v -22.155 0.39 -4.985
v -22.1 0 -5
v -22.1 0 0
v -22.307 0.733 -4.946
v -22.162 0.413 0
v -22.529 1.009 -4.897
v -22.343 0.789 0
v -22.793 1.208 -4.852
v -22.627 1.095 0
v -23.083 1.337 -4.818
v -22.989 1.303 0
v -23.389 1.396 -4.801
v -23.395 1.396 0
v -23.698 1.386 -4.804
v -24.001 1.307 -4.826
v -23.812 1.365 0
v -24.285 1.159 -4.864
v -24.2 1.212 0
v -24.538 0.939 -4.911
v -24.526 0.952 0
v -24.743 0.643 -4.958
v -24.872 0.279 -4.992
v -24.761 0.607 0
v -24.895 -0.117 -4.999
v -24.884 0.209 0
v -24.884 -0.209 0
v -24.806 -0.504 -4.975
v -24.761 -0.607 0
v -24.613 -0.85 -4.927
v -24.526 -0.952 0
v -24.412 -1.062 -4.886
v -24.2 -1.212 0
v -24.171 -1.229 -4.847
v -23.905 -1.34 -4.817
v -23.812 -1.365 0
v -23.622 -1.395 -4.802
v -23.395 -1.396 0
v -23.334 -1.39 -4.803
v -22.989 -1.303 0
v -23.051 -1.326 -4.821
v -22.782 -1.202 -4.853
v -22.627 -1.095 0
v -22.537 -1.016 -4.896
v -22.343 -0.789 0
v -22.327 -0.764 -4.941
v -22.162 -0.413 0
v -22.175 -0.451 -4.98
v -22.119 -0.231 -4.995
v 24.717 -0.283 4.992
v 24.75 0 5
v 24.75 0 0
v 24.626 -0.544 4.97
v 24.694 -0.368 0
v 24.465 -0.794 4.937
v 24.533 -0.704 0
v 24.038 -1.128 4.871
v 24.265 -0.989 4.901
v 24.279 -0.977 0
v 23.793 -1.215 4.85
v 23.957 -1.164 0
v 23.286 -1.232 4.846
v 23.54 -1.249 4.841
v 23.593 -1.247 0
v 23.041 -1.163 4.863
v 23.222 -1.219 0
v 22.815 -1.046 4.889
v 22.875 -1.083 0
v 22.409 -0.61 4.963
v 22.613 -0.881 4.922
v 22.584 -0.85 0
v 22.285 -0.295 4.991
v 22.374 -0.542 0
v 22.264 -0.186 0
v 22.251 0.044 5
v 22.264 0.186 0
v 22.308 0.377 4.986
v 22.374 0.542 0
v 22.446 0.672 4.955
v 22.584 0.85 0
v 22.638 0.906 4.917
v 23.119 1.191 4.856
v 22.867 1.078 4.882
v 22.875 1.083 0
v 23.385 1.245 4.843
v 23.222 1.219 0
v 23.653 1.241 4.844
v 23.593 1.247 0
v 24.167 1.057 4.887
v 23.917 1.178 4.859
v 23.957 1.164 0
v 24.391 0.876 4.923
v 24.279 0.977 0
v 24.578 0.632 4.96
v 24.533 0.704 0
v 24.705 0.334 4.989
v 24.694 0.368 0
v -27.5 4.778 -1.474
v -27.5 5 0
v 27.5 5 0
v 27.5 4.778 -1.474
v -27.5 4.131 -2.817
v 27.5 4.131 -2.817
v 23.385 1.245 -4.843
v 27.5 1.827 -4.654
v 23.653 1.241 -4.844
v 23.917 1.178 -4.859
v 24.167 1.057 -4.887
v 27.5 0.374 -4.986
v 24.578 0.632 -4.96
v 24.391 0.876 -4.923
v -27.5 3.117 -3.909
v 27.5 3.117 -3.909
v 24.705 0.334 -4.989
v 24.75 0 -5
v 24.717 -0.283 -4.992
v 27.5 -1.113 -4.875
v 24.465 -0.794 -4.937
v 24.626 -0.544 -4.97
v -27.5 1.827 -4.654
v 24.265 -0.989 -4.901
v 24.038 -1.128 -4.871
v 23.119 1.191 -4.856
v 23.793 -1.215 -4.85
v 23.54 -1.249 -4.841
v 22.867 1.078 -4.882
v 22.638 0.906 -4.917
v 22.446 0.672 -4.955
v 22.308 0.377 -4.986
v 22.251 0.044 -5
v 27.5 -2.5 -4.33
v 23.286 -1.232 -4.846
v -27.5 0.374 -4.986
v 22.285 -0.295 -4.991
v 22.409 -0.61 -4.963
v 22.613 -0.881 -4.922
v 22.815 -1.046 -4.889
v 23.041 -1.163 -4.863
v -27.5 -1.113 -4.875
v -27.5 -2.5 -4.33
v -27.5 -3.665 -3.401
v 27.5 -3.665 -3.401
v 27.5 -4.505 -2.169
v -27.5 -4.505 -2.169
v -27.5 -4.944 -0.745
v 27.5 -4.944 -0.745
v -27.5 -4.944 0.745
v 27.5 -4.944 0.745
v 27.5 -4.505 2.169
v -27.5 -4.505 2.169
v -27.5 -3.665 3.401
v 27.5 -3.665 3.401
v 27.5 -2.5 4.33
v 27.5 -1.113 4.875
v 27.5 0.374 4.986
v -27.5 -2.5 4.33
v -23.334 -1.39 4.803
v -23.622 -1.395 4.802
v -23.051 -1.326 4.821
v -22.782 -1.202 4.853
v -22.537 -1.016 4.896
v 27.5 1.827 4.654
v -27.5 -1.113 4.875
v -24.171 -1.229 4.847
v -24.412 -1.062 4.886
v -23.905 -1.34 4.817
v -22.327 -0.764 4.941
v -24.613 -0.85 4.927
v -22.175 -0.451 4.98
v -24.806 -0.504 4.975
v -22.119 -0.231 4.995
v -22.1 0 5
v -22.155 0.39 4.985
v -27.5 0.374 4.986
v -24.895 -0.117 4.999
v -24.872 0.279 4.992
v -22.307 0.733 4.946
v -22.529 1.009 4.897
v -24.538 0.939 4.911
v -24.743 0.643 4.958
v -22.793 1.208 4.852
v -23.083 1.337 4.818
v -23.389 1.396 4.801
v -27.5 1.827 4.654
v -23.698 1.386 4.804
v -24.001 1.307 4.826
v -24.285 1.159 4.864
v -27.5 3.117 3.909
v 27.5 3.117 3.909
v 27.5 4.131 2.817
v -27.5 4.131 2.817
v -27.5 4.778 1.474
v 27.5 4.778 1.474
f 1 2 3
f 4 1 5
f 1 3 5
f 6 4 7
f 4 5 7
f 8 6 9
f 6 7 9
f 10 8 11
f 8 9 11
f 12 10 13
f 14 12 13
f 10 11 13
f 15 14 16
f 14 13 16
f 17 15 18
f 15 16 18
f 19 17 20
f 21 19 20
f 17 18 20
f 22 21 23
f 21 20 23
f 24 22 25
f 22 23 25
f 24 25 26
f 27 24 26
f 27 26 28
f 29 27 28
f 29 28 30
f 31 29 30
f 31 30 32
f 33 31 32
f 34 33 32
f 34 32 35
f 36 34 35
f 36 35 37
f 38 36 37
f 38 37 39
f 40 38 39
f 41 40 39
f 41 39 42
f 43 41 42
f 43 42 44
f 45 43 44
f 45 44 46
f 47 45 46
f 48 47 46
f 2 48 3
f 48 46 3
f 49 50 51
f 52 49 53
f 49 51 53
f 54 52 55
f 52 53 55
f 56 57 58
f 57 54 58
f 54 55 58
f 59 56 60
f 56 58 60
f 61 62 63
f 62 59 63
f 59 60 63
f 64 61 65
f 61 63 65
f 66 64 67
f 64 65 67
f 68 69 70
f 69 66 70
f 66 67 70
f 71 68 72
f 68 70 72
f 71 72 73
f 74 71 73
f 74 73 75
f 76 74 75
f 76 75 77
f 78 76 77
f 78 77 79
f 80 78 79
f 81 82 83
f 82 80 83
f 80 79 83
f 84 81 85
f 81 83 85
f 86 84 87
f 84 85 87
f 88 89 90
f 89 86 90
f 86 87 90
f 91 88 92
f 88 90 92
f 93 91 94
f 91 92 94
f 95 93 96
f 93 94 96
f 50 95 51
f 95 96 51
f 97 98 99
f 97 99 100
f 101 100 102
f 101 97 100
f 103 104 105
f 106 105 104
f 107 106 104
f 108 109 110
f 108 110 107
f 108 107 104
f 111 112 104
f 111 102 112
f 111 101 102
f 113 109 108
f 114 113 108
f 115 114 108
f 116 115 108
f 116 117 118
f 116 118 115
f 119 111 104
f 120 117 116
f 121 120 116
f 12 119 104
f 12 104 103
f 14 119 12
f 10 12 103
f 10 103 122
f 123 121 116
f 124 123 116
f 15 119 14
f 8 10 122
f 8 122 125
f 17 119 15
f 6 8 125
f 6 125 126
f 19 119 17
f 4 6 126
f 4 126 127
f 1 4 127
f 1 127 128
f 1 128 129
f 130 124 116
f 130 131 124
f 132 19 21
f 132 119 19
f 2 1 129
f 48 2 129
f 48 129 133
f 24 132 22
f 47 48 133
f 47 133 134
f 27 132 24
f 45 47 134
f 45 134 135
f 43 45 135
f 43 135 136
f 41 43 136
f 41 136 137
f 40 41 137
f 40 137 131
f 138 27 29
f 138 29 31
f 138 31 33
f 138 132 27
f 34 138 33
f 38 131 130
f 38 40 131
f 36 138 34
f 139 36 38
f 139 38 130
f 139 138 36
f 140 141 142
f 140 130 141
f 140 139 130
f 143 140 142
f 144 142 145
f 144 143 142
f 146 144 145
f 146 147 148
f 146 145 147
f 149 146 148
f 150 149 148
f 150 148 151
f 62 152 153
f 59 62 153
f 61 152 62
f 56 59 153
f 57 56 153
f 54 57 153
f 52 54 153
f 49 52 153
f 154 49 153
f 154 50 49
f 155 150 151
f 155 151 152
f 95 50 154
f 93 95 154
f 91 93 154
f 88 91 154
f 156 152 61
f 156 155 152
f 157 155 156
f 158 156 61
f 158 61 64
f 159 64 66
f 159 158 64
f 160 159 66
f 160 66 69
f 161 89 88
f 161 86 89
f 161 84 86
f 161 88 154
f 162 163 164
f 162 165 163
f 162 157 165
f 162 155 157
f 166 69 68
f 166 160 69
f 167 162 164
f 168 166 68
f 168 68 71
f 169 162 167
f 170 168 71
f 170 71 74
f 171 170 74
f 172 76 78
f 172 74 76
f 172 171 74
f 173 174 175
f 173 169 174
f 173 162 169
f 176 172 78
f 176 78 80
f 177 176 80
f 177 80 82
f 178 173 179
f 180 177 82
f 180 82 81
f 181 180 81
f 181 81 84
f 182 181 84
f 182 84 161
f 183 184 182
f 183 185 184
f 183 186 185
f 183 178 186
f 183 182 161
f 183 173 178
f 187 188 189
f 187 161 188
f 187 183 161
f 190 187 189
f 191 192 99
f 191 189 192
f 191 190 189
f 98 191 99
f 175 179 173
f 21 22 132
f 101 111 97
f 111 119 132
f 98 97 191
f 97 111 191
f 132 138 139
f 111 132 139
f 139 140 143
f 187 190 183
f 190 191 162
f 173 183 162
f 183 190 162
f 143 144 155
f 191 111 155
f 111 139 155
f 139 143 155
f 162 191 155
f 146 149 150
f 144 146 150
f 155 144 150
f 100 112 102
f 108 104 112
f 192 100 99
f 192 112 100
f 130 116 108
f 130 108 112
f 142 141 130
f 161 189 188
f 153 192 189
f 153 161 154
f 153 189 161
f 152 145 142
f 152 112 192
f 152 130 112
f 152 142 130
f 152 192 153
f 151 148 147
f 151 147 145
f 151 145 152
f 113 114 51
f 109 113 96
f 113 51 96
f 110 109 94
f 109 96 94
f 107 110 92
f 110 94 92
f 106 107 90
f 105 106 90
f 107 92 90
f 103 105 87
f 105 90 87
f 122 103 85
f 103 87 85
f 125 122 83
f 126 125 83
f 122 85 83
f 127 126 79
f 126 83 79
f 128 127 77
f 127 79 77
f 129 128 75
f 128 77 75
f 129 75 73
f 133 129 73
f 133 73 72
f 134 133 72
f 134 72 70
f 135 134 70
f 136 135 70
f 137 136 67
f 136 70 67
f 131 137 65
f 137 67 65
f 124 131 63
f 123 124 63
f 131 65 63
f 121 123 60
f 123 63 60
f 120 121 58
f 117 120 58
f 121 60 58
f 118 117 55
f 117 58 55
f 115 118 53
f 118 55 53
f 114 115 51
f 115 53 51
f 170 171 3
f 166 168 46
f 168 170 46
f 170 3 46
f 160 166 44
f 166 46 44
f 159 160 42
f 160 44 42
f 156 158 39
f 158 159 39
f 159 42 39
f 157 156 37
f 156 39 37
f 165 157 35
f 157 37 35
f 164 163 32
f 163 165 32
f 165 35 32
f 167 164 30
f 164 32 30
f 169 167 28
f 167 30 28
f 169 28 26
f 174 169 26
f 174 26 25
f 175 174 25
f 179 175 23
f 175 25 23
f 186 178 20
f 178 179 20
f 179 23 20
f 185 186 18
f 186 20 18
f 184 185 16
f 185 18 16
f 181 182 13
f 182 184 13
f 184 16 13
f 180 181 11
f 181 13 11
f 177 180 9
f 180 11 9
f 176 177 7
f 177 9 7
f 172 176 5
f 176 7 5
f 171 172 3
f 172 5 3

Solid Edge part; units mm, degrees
sketch "Sketch1" plane through (0, 0, 0) normal (1, 0, 0) x (0, 1, 0)
  circle A0 centre (0, 0) radius 5
extrude "Protrusion1" add sketch "Sketch1" along normal mid plane 55
cosmetic_thread "Thread_1" size "Tr 10 x 2" thread depth 15
cosmetic_thread "Thread_2" size "Tr 10 x 2" thread depth 18
sketch "Sketch2" plane through (0, 0, 0) normal (0, 0, 1) x (1, 0, 0)
  circle A0 centre (-23.5, 0) radius 1.4
  circle A1 centre (23.5, 0) radius 1.25
extrude "ExtrudedCutout_1" cut sketch "Sketch2" along normal mid plane 31.5098
